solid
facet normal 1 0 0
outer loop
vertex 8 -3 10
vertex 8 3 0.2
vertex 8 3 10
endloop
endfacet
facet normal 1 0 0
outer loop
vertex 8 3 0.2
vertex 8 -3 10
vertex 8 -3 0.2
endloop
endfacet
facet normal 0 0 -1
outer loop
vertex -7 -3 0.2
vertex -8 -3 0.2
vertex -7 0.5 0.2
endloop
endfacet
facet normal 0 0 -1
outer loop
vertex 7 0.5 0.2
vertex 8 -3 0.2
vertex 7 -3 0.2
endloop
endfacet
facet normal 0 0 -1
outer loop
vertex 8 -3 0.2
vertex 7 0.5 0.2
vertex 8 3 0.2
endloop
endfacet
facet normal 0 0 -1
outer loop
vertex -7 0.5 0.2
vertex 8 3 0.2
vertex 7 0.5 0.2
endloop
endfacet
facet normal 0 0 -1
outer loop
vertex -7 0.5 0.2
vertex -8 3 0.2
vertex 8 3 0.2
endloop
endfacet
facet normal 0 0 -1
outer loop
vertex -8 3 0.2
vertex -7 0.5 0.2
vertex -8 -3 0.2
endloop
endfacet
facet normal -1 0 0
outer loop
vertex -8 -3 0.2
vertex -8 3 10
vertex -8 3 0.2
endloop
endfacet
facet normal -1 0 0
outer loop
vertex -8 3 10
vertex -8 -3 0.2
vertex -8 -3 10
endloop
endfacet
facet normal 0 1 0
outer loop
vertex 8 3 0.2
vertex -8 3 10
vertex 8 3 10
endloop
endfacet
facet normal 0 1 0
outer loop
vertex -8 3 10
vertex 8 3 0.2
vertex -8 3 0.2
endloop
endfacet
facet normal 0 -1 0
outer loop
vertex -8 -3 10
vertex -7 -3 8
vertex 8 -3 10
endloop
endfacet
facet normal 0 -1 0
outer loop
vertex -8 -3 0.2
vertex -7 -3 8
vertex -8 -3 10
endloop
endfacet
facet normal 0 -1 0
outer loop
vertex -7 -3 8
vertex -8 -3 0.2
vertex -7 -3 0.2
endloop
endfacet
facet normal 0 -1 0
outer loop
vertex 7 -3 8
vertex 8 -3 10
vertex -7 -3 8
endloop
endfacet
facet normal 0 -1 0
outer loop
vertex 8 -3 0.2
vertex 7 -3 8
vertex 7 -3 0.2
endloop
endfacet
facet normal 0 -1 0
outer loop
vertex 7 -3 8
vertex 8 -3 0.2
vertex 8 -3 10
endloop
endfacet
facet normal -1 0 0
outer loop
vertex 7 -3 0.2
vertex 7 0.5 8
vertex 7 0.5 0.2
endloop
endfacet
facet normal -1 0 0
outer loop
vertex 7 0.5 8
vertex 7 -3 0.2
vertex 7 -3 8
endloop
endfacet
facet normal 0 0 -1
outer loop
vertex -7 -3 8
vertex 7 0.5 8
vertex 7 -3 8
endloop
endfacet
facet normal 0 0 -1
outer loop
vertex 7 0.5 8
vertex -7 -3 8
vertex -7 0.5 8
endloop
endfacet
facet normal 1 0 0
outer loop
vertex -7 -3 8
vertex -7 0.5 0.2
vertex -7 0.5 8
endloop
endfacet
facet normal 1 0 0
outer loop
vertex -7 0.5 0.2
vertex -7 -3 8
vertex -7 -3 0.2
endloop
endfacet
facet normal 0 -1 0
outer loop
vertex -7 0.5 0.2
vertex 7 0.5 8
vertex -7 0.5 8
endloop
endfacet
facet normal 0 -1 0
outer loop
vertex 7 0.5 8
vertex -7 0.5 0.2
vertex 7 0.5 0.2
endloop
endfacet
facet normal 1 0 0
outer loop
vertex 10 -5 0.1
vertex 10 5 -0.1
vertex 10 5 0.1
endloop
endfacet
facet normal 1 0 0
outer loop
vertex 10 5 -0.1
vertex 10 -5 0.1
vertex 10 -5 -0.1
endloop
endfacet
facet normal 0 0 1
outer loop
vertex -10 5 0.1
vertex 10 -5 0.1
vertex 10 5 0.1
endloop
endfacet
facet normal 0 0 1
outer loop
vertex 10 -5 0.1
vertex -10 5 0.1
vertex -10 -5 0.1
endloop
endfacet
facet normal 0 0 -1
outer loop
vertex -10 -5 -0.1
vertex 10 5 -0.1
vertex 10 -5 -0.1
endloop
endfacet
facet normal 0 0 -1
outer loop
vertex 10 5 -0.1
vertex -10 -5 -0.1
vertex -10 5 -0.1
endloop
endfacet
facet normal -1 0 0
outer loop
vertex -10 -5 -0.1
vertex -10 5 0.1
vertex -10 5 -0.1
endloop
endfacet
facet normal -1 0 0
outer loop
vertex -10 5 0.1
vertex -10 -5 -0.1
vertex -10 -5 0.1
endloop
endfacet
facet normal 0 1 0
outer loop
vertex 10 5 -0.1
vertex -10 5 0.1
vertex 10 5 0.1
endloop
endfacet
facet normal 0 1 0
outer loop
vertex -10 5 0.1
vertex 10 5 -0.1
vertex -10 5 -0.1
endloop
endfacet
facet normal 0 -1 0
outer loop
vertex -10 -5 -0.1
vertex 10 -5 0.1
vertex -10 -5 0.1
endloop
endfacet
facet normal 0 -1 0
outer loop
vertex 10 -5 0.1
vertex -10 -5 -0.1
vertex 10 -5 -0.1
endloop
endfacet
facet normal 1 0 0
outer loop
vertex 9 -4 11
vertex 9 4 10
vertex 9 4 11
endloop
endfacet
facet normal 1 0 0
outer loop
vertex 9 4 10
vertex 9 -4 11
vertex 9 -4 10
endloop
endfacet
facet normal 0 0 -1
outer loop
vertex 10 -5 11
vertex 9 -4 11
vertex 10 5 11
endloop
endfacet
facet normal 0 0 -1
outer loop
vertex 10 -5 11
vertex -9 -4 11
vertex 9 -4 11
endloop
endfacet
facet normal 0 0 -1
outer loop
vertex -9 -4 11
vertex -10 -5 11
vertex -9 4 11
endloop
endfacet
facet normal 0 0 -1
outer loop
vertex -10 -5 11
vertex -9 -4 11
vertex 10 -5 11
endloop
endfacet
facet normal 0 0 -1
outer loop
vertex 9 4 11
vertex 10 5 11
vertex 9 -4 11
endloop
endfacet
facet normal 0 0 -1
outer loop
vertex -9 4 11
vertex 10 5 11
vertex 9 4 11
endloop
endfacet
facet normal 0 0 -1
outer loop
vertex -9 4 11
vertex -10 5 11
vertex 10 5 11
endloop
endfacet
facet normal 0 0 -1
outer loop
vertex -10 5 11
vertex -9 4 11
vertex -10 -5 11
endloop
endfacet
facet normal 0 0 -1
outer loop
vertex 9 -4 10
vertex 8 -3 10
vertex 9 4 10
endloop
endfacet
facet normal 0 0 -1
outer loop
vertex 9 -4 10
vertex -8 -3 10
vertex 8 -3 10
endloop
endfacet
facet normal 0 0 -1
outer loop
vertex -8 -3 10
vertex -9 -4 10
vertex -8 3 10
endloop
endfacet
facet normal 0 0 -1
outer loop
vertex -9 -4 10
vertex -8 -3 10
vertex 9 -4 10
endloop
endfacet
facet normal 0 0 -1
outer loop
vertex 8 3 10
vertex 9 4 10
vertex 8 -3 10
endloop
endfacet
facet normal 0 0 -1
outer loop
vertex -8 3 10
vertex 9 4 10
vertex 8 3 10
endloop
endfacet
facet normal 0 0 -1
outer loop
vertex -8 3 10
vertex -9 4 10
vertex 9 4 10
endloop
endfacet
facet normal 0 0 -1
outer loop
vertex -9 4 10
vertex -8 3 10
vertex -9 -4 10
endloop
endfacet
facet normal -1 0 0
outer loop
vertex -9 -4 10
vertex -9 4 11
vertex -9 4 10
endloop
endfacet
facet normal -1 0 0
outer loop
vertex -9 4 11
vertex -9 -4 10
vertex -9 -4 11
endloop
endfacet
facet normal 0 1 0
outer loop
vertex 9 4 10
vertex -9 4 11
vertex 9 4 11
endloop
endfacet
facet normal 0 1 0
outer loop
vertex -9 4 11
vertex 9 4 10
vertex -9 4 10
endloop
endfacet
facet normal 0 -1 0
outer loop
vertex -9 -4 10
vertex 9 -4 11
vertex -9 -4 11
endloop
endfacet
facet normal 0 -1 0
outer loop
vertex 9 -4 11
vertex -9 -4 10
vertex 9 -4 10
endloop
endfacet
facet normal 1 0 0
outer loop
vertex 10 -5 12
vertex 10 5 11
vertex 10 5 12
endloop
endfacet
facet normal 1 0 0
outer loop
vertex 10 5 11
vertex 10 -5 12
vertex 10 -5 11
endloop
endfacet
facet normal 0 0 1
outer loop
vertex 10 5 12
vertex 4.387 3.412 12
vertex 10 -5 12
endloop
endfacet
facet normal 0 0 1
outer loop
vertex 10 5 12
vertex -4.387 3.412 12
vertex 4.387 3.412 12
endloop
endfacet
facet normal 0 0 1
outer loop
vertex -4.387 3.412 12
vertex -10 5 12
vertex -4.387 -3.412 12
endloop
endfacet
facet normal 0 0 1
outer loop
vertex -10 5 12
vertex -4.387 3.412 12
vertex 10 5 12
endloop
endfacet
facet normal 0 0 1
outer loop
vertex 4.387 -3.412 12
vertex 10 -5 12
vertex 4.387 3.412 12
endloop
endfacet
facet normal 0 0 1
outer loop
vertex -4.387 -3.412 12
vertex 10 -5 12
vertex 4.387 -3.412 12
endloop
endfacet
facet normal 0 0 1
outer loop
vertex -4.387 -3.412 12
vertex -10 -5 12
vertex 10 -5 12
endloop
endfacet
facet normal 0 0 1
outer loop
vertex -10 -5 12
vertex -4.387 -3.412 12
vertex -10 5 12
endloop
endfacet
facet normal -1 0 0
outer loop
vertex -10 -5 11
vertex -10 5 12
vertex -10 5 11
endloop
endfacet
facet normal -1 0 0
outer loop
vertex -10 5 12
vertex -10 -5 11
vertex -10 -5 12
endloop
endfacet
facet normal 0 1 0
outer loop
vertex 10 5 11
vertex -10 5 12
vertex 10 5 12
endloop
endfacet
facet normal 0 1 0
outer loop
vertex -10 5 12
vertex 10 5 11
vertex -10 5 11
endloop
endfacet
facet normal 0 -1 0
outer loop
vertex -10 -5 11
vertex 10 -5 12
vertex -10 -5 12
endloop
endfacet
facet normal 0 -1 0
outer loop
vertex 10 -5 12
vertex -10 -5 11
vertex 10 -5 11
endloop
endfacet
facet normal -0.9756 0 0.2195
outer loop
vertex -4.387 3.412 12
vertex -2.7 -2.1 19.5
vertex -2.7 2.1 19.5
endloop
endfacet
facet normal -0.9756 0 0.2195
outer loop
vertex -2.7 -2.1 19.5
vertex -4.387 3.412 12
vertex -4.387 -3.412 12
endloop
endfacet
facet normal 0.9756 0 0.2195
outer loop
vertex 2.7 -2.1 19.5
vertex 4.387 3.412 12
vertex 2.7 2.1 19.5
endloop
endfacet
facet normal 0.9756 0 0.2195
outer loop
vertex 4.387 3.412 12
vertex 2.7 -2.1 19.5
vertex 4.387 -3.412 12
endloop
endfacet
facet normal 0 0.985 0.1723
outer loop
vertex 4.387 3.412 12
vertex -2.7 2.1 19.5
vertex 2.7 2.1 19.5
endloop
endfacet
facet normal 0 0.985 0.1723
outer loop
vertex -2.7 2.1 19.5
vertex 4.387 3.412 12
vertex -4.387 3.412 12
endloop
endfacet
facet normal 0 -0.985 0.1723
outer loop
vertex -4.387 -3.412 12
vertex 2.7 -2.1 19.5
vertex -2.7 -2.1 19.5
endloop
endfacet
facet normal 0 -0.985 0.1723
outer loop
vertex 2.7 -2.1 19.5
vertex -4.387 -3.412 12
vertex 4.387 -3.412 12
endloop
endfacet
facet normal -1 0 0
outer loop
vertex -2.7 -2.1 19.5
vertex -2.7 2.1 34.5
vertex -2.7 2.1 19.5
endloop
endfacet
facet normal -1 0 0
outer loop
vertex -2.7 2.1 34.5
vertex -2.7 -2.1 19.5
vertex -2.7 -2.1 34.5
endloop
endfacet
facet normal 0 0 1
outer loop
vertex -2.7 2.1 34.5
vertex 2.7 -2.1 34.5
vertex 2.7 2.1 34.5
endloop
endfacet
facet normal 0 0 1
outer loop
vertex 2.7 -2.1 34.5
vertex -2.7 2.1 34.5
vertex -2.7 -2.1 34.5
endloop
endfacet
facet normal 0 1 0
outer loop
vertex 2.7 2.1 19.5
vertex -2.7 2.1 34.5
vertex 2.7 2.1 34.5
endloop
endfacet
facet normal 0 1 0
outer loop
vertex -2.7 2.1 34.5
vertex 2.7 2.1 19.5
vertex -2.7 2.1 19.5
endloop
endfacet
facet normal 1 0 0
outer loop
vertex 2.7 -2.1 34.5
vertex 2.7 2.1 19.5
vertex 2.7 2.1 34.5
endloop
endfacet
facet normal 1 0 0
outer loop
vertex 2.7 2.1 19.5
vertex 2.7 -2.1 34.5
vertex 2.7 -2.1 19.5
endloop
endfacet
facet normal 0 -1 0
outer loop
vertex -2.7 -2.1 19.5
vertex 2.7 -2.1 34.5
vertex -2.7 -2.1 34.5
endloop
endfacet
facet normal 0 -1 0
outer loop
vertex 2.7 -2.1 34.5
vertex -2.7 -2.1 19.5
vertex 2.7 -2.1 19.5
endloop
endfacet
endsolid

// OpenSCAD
color("gray")
cube([20,10,0.2], center= true);


difference(){

translate([0,0,0.2+5])
color("red")
cube([16,6,10], center= true);


translate([0,-2,4])
color("red")
cube([14,5,8], center= true);

}



translate([0,0,10.5])
color("gray")
cube([18,8,1], center= true);

translate([0,0,11.5])
color("black")
cube([20,10,1], center= true);


translate([0,0,11.5])
color("red")
linear_extrude(height = 8, scale = 0.6) 
square([9,7], center = true);


translate([0,0,19.5])
color("red")
linear_extrude(height = 15, scale = 1) 
square([9 *0.6,7 *0.6], center = true);
